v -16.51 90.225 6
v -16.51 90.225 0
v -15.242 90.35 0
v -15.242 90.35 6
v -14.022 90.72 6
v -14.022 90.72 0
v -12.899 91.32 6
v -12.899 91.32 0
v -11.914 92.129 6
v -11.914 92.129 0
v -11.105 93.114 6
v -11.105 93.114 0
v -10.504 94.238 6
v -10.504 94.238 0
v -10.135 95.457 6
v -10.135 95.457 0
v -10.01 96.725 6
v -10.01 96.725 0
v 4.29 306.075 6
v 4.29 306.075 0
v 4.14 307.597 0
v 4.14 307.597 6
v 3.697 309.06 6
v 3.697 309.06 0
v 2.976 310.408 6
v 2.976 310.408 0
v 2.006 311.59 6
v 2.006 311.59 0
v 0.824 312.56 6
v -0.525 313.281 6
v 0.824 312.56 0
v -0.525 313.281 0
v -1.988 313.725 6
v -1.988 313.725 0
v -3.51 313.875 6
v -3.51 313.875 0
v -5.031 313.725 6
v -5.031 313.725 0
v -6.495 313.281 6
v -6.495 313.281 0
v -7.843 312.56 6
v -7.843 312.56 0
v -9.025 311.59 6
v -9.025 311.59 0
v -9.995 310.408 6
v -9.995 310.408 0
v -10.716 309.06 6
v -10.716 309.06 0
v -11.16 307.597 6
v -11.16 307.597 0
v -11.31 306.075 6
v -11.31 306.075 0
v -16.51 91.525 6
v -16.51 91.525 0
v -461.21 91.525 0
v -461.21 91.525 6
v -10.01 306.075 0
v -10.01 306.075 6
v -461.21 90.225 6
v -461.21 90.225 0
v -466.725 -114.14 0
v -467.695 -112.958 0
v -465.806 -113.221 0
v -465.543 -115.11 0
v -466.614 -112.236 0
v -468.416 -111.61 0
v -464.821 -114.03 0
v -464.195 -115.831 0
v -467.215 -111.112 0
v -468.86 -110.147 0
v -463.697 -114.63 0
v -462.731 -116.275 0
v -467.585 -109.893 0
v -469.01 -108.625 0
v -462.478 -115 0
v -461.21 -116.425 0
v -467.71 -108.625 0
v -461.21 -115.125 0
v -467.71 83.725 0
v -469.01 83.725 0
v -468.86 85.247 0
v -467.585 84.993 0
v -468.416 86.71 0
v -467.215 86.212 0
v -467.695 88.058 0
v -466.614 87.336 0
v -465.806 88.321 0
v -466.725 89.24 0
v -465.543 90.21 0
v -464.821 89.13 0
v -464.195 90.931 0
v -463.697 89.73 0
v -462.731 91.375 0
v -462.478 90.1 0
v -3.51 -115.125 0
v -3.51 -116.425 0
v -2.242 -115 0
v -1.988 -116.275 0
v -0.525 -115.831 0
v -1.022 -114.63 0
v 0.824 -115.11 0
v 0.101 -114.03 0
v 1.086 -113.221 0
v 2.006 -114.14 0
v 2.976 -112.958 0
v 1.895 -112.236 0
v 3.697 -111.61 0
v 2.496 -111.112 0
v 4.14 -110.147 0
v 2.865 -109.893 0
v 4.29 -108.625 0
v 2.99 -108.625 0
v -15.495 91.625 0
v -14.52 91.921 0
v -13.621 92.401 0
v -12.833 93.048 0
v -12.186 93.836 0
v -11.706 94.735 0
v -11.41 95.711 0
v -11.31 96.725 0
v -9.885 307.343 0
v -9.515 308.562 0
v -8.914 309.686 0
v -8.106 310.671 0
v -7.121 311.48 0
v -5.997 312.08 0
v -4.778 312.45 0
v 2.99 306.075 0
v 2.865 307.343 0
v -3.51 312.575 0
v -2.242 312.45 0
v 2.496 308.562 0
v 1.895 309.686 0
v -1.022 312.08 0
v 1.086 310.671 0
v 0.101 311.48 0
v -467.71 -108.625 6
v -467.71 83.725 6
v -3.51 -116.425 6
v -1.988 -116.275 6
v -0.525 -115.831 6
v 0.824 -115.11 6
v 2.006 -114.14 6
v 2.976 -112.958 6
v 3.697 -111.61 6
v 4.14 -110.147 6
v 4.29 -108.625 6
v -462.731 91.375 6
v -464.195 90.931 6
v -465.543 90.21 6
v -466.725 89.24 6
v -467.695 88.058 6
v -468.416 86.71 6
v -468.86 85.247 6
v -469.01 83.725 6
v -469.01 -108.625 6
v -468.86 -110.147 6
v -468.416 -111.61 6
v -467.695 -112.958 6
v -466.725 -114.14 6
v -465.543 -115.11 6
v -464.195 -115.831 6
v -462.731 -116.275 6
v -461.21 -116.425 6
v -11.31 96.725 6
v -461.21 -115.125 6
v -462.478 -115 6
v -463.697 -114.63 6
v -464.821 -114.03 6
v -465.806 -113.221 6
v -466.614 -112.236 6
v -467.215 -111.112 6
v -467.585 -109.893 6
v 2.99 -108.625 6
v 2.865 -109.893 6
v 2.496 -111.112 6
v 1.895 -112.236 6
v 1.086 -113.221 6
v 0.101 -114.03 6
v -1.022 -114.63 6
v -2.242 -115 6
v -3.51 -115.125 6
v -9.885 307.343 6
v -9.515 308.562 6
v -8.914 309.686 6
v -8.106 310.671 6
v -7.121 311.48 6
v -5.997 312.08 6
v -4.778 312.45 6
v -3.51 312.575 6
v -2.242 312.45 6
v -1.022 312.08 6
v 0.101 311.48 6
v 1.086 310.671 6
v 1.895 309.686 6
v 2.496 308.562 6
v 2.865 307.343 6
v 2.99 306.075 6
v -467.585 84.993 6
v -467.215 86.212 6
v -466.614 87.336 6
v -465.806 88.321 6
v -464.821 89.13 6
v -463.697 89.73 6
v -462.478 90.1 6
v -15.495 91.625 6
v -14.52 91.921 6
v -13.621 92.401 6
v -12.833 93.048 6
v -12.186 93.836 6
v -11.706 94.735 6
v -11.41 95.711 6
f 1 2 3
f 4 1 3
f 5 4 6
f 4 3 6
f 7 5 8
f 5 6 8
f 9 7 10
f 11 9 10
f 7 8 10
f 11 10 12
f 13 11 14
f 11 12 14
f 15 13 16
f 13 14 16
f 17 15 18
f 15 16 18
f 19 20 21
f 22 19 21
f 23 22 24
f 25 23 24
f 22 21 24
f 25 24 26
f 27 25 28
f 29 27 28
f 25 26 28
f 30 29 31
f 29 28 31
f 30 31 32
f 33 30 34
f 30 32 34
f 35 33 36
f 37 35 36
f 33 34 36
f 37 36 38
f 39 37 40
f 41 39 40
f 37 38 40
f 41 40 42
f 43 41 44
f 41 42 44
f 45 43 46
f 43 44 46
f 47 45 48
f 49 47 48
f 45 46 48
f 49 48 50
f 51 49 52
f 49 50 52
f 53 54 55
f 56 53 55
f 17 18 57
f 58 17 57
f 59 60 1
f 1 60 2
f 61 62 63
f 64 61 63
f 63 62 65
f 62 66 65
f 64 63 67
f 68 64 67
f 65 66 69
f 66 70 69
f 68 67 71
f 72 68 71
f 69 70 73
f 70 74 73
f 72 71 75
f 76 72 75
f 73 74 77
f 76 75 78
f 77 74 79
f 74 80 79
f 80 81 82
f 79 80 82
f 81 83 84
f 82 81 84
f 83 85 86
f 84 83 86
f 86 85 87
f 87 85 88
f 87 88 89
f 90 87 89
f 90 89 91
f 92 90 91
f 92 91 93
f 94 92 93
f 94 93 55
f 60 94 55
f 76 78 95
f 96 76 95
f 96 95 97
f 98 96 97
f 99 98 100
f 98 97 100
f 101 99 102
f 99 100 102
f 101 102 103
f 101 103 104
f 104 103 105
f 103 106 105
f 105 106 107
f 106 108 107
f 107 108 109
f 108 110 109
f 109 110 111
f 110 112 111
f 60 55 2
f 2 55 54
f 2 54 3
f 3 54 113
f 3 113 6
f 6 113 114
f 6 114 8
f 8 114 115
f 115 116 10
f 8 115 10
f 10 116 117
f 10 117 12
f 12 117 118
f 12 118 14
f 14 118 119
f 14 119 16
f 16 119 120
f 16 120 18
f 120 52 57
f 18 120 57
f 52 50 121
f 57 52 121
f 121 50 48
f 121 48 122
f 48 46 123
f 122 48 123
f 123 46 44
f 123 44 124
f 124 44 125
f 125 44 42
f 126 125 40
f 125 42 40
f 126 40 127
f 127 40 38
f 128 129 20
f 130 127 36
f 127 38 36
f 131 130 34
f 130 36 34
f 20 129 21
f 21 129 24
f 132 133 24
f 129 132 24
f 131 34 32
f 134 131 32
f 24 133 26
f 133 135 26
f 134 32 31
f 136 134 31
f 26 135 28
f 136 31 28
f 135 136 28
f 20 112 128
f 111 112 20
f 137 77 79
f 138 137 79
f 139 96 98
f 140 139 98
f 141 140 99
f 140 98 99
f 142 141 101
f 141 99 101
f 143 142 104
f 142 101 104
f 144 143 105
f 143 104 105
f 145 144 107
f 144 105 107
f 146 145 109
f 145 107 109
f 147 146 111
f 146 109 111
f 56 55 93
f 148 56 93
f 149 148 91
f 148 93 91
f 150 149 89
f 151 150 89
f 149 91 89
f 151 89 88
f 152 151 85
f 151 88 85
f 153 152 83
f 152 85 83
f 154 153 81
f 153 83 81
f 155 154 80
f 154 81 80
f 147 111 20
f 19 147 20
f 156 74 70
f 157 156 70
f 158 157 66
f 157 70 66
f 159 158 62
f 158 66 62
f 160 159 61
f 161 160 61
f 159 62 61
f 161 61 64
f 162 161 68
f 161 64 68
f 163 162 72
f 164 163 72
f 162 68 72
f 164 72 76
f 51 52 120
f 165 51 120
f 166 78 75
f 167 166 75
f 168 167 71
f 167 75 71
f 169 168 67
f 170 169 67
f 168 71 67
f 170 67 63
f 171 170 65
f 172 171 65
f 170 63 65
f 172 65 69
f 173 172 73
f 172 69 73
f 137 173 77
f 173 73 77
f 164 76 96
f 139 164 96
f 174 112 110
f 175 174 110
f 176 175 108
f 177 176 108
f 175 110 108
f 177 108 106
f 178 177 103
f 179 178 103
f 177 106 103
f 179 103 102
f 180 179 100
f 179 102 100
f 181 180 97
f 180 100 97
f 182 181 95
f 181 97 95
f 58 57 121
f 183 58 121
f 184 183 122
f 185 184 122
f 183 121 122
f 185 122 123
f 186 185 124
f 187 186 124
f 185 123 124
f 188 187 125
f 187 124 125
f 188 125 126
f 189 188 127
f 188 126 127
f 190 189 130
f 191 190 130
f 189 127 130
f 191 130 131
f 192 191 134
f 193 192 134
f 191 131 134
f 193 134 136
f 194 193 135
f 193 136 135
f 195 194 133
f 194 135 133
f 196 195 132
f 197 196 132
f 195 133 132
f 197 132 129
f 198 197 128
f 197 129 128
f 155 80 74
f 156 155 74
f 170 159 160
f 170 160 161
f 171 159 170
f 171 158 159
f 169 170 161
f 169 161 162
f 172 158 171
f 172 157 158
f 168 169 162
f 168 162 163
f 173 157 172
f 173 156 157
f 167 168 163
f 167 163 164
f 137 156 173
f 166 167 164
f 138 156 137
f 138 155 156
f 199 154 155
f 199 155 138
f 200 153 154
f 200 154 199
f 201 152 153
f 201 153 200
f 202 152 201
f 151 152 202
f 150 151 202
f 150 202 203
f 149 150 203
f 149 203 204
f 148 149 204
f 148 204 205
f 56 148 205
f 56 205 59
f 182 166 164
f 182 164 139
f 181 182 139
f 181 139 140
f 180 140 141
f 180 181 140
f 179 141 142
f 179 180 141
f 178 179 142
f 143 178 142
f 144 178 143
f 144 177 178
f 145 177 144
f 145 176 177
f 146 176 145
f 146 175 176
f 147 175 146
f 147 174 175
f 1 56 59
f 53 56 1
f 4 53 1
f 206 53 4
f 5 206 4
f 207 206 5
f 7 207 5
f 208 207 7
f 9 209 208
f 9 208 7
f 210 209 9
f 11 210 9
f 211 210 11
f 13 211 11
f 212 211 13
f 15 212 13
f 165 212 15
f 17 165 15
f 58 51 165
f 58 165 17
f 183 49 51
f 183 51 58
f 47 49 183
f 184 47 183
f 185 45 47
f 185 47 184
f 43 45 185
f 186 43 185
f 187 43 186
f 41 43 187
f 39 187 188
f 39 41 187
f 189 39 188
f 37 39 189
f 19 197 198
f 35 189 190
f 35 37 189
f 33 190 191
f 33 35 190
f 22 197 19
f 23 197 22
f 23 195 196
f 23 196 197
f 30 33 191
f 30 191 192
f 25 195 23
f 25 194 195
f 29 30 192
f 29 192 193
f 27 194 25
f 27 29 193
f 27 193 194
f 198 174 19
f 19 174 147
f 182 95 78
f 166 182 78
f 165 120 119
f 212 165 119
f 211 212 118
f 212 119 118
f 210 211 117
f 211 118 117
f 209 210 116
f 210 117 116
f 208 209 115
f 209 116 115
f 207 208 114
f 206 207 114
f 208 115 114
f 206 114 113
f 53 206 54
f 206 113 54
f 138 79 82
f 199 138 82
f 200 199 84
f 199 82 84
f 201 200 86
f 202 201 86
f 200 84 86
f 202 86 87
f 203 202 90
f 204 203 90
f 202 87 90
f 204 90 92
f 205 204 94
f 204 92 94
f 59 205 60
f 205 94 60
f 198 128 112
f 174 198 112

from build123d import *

# Parameters (mm, degrees)
F1_DEPTH = 6


with BuildPart() as f1:
    # F0 (on Top) → F1 (new body)
    with BuildSketch(Plane.XY):
        with BuildLine():
            Line((4.290289, -108.624975), (4.290289, 306.075025))
            ThreePointArc((4.290289, 306.075025), (-3.509711, 313.875025), (-11.309711, 306.075025))
            Line((-11.309711, 306.075025), (-11.309711, 96.725025))
            ThreePointArc((-11.309711, 96.725025), (-12.832756, 93.04807), (-16.509711, 91.525025))
            Line((-16.509711, 91.525025), (-441.135317, 91.525025))
            Line((-441.135317, 91.525025), (-461.209711, 91.525025))
            ThreePointArc((-461.209711, 91.525025), (-466.725144, 89.240458), (-469.009711, 83.725025))
            Line((-469.009711, 83.725025), (-469.009711, -108.624975))
            ThreePointArc((-469.009711, -108.624975), (-466.725144, -114.140408), (-461.209711, -116.424975))
            Line((-461.209711, -116.424975), (-3.509711, -116.424975))
            ThreePointArc((-3.509711, -116.424975), (2.005722, -114.140408), (4.290289, -108.624975))
        make_face()
        with BuildLine():
            ThreePointArc((-10.009711, 306.075025), (-3.509711, 312.575025), (2.990289, 306.075025))
            Line((2.990289, 306.075025), (2.990289, -108.624975))
            ThreePointArc((2.990289, -108.624975), (1.086483, -113.221169), (-3.509711, -115.124975))
            Line((-3.509711, -115.124975), (-461.209711, -115.124975))
            ThreePointArc((-461.209711, -115.124975), (-465.805905, -113.221169), (-467.709711, -108.624975))
            Line((-467.709711, -108.624975), (-467.709711, 83.725025))
            ThreePointArc((-467.709711, 83.725025), (-465.805905, 88.321219), (-461.209711, 90.225025))
            Line((-461.209711, 90.225025), (-244.859711, 90.225025))
            Line((-244.859711, 90.225025), (-16.509711, 90.225025))
            ThreePointArc((-16.509711, 90.225025), (-11.913517, 92.128831), (-10.009711, 96.725025))
            Line((-10.009711, 96.725025), (-10.009711, 306.075025))
        make_face(mode=Mode.SUBTRACT)
    extrude(amount=F1_DEPTH)


solid = f1.part
